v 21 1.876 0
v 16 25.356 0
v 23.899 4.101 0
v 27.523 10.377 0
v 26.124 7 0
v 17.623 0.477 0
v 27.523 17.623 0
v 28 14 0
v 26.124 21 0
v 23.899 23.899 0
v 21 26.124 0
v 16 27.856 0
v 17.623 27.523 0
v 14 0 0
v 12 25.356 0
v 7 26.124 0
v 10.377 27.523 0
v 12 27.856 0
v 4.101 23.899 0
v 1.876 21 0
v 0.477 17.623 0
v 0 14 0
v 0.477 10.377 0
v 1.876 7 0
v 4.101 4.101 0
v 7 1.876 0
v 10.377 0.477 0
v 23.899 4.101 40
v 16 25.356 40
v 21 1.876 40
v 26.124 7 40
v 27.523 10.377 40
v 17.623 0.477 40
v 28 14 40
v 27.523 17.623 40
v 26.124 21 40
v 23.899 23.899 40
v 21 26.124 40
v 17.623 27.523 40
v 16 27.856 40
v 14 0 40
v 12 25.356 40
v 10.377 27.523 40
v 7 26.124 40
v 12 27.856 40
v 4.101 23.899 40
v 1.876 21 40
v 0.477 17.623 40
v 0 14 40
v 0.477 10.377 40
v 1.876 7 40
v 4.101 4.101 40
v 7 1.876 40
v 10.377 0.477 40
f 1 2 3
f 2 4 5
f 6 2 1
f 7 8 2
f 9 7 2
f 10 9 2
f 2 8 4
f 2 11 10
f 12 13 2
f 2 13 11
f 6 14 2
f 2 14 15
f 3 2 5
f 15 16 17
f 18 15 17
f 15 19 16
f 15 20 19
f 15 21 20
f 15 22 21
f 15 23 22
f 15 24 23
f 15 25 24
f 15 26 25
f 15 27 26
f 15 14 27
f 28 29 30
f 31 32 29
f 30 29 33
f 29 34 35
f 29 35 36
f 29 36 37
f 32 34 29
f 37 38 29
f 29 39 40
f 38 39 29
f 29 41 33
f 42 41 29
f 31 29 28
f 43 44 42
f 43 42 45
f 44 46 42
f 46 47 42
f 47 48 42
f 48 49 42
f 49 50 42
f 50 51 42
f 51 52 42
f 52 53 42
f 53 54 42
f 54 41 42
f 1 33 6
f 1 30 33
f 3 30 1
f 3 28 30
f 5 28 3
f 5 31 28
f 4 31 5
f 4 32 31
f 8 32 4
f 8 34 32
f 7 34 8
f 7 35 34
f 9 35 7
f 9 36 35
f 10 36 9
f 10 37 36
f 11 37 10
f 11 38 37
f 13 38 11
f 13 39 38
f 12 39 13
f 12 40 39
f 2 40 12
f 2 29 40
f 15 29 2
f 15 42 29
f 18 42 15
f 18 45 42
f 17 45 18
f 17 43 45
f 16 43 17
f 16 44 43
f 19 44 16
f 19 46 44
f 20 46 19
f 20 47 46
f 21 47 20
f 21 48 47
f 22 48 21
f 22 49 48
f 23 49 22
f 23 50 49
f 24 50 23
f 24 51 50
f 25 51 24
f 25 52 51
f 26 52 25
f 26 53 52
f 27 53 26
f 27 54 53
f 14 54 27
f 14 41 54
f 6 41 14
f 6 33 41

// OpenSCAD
$fn = 32;

// ----------------------------------------------------------------------
// Keyway shaft: d28 shaft, key 4 x 2.5 mm
// ----------------------------------------------------------------------

// --- parameters (mm) ---
shaft_r = 14;             // shaft radius
key_w = 4;                // keyway width
key_d = 2.5;              // keyway depth below the surface line
plate_t = 40;             // shaft length, Z (extrusion height)
fit_tol = 0.1;            // declared fit tolerance (prompt contract)
free_tol = 0.3;           // declared free tolerance (prompt contract)

shaft_d = 2 * shaft_r;  // shaft diameter
circle_step = 15;  // polygon sampling step, degrees

profile = [[10.377, 27.523], [7, 26.124], [4.101, 23.899], [1.876, 21], [0.477, 17.623], [0, 14], [0.477, 10.377], [1.876, 7], [4.101, 4.101], [7, 1.876], [10.377, 0.477], [14, 0], [17.623, 0.477], [21, 1.876], [23.899, 4.101], [26.124, 7], [27.523, 10.377], [28, 14], [27.523, 17.623], [26.124, 21], [23.899, 23.899], [21, 26.124], [17.623, 27.523], [16, 27.856], [16, 25.356], [12, 25.356], [12, 27.856]];  // primary outline, 27 points, counter clockwise

// --- the one profile operation ---
linear_extrude(height = plate_t) polygon(points = profile);
